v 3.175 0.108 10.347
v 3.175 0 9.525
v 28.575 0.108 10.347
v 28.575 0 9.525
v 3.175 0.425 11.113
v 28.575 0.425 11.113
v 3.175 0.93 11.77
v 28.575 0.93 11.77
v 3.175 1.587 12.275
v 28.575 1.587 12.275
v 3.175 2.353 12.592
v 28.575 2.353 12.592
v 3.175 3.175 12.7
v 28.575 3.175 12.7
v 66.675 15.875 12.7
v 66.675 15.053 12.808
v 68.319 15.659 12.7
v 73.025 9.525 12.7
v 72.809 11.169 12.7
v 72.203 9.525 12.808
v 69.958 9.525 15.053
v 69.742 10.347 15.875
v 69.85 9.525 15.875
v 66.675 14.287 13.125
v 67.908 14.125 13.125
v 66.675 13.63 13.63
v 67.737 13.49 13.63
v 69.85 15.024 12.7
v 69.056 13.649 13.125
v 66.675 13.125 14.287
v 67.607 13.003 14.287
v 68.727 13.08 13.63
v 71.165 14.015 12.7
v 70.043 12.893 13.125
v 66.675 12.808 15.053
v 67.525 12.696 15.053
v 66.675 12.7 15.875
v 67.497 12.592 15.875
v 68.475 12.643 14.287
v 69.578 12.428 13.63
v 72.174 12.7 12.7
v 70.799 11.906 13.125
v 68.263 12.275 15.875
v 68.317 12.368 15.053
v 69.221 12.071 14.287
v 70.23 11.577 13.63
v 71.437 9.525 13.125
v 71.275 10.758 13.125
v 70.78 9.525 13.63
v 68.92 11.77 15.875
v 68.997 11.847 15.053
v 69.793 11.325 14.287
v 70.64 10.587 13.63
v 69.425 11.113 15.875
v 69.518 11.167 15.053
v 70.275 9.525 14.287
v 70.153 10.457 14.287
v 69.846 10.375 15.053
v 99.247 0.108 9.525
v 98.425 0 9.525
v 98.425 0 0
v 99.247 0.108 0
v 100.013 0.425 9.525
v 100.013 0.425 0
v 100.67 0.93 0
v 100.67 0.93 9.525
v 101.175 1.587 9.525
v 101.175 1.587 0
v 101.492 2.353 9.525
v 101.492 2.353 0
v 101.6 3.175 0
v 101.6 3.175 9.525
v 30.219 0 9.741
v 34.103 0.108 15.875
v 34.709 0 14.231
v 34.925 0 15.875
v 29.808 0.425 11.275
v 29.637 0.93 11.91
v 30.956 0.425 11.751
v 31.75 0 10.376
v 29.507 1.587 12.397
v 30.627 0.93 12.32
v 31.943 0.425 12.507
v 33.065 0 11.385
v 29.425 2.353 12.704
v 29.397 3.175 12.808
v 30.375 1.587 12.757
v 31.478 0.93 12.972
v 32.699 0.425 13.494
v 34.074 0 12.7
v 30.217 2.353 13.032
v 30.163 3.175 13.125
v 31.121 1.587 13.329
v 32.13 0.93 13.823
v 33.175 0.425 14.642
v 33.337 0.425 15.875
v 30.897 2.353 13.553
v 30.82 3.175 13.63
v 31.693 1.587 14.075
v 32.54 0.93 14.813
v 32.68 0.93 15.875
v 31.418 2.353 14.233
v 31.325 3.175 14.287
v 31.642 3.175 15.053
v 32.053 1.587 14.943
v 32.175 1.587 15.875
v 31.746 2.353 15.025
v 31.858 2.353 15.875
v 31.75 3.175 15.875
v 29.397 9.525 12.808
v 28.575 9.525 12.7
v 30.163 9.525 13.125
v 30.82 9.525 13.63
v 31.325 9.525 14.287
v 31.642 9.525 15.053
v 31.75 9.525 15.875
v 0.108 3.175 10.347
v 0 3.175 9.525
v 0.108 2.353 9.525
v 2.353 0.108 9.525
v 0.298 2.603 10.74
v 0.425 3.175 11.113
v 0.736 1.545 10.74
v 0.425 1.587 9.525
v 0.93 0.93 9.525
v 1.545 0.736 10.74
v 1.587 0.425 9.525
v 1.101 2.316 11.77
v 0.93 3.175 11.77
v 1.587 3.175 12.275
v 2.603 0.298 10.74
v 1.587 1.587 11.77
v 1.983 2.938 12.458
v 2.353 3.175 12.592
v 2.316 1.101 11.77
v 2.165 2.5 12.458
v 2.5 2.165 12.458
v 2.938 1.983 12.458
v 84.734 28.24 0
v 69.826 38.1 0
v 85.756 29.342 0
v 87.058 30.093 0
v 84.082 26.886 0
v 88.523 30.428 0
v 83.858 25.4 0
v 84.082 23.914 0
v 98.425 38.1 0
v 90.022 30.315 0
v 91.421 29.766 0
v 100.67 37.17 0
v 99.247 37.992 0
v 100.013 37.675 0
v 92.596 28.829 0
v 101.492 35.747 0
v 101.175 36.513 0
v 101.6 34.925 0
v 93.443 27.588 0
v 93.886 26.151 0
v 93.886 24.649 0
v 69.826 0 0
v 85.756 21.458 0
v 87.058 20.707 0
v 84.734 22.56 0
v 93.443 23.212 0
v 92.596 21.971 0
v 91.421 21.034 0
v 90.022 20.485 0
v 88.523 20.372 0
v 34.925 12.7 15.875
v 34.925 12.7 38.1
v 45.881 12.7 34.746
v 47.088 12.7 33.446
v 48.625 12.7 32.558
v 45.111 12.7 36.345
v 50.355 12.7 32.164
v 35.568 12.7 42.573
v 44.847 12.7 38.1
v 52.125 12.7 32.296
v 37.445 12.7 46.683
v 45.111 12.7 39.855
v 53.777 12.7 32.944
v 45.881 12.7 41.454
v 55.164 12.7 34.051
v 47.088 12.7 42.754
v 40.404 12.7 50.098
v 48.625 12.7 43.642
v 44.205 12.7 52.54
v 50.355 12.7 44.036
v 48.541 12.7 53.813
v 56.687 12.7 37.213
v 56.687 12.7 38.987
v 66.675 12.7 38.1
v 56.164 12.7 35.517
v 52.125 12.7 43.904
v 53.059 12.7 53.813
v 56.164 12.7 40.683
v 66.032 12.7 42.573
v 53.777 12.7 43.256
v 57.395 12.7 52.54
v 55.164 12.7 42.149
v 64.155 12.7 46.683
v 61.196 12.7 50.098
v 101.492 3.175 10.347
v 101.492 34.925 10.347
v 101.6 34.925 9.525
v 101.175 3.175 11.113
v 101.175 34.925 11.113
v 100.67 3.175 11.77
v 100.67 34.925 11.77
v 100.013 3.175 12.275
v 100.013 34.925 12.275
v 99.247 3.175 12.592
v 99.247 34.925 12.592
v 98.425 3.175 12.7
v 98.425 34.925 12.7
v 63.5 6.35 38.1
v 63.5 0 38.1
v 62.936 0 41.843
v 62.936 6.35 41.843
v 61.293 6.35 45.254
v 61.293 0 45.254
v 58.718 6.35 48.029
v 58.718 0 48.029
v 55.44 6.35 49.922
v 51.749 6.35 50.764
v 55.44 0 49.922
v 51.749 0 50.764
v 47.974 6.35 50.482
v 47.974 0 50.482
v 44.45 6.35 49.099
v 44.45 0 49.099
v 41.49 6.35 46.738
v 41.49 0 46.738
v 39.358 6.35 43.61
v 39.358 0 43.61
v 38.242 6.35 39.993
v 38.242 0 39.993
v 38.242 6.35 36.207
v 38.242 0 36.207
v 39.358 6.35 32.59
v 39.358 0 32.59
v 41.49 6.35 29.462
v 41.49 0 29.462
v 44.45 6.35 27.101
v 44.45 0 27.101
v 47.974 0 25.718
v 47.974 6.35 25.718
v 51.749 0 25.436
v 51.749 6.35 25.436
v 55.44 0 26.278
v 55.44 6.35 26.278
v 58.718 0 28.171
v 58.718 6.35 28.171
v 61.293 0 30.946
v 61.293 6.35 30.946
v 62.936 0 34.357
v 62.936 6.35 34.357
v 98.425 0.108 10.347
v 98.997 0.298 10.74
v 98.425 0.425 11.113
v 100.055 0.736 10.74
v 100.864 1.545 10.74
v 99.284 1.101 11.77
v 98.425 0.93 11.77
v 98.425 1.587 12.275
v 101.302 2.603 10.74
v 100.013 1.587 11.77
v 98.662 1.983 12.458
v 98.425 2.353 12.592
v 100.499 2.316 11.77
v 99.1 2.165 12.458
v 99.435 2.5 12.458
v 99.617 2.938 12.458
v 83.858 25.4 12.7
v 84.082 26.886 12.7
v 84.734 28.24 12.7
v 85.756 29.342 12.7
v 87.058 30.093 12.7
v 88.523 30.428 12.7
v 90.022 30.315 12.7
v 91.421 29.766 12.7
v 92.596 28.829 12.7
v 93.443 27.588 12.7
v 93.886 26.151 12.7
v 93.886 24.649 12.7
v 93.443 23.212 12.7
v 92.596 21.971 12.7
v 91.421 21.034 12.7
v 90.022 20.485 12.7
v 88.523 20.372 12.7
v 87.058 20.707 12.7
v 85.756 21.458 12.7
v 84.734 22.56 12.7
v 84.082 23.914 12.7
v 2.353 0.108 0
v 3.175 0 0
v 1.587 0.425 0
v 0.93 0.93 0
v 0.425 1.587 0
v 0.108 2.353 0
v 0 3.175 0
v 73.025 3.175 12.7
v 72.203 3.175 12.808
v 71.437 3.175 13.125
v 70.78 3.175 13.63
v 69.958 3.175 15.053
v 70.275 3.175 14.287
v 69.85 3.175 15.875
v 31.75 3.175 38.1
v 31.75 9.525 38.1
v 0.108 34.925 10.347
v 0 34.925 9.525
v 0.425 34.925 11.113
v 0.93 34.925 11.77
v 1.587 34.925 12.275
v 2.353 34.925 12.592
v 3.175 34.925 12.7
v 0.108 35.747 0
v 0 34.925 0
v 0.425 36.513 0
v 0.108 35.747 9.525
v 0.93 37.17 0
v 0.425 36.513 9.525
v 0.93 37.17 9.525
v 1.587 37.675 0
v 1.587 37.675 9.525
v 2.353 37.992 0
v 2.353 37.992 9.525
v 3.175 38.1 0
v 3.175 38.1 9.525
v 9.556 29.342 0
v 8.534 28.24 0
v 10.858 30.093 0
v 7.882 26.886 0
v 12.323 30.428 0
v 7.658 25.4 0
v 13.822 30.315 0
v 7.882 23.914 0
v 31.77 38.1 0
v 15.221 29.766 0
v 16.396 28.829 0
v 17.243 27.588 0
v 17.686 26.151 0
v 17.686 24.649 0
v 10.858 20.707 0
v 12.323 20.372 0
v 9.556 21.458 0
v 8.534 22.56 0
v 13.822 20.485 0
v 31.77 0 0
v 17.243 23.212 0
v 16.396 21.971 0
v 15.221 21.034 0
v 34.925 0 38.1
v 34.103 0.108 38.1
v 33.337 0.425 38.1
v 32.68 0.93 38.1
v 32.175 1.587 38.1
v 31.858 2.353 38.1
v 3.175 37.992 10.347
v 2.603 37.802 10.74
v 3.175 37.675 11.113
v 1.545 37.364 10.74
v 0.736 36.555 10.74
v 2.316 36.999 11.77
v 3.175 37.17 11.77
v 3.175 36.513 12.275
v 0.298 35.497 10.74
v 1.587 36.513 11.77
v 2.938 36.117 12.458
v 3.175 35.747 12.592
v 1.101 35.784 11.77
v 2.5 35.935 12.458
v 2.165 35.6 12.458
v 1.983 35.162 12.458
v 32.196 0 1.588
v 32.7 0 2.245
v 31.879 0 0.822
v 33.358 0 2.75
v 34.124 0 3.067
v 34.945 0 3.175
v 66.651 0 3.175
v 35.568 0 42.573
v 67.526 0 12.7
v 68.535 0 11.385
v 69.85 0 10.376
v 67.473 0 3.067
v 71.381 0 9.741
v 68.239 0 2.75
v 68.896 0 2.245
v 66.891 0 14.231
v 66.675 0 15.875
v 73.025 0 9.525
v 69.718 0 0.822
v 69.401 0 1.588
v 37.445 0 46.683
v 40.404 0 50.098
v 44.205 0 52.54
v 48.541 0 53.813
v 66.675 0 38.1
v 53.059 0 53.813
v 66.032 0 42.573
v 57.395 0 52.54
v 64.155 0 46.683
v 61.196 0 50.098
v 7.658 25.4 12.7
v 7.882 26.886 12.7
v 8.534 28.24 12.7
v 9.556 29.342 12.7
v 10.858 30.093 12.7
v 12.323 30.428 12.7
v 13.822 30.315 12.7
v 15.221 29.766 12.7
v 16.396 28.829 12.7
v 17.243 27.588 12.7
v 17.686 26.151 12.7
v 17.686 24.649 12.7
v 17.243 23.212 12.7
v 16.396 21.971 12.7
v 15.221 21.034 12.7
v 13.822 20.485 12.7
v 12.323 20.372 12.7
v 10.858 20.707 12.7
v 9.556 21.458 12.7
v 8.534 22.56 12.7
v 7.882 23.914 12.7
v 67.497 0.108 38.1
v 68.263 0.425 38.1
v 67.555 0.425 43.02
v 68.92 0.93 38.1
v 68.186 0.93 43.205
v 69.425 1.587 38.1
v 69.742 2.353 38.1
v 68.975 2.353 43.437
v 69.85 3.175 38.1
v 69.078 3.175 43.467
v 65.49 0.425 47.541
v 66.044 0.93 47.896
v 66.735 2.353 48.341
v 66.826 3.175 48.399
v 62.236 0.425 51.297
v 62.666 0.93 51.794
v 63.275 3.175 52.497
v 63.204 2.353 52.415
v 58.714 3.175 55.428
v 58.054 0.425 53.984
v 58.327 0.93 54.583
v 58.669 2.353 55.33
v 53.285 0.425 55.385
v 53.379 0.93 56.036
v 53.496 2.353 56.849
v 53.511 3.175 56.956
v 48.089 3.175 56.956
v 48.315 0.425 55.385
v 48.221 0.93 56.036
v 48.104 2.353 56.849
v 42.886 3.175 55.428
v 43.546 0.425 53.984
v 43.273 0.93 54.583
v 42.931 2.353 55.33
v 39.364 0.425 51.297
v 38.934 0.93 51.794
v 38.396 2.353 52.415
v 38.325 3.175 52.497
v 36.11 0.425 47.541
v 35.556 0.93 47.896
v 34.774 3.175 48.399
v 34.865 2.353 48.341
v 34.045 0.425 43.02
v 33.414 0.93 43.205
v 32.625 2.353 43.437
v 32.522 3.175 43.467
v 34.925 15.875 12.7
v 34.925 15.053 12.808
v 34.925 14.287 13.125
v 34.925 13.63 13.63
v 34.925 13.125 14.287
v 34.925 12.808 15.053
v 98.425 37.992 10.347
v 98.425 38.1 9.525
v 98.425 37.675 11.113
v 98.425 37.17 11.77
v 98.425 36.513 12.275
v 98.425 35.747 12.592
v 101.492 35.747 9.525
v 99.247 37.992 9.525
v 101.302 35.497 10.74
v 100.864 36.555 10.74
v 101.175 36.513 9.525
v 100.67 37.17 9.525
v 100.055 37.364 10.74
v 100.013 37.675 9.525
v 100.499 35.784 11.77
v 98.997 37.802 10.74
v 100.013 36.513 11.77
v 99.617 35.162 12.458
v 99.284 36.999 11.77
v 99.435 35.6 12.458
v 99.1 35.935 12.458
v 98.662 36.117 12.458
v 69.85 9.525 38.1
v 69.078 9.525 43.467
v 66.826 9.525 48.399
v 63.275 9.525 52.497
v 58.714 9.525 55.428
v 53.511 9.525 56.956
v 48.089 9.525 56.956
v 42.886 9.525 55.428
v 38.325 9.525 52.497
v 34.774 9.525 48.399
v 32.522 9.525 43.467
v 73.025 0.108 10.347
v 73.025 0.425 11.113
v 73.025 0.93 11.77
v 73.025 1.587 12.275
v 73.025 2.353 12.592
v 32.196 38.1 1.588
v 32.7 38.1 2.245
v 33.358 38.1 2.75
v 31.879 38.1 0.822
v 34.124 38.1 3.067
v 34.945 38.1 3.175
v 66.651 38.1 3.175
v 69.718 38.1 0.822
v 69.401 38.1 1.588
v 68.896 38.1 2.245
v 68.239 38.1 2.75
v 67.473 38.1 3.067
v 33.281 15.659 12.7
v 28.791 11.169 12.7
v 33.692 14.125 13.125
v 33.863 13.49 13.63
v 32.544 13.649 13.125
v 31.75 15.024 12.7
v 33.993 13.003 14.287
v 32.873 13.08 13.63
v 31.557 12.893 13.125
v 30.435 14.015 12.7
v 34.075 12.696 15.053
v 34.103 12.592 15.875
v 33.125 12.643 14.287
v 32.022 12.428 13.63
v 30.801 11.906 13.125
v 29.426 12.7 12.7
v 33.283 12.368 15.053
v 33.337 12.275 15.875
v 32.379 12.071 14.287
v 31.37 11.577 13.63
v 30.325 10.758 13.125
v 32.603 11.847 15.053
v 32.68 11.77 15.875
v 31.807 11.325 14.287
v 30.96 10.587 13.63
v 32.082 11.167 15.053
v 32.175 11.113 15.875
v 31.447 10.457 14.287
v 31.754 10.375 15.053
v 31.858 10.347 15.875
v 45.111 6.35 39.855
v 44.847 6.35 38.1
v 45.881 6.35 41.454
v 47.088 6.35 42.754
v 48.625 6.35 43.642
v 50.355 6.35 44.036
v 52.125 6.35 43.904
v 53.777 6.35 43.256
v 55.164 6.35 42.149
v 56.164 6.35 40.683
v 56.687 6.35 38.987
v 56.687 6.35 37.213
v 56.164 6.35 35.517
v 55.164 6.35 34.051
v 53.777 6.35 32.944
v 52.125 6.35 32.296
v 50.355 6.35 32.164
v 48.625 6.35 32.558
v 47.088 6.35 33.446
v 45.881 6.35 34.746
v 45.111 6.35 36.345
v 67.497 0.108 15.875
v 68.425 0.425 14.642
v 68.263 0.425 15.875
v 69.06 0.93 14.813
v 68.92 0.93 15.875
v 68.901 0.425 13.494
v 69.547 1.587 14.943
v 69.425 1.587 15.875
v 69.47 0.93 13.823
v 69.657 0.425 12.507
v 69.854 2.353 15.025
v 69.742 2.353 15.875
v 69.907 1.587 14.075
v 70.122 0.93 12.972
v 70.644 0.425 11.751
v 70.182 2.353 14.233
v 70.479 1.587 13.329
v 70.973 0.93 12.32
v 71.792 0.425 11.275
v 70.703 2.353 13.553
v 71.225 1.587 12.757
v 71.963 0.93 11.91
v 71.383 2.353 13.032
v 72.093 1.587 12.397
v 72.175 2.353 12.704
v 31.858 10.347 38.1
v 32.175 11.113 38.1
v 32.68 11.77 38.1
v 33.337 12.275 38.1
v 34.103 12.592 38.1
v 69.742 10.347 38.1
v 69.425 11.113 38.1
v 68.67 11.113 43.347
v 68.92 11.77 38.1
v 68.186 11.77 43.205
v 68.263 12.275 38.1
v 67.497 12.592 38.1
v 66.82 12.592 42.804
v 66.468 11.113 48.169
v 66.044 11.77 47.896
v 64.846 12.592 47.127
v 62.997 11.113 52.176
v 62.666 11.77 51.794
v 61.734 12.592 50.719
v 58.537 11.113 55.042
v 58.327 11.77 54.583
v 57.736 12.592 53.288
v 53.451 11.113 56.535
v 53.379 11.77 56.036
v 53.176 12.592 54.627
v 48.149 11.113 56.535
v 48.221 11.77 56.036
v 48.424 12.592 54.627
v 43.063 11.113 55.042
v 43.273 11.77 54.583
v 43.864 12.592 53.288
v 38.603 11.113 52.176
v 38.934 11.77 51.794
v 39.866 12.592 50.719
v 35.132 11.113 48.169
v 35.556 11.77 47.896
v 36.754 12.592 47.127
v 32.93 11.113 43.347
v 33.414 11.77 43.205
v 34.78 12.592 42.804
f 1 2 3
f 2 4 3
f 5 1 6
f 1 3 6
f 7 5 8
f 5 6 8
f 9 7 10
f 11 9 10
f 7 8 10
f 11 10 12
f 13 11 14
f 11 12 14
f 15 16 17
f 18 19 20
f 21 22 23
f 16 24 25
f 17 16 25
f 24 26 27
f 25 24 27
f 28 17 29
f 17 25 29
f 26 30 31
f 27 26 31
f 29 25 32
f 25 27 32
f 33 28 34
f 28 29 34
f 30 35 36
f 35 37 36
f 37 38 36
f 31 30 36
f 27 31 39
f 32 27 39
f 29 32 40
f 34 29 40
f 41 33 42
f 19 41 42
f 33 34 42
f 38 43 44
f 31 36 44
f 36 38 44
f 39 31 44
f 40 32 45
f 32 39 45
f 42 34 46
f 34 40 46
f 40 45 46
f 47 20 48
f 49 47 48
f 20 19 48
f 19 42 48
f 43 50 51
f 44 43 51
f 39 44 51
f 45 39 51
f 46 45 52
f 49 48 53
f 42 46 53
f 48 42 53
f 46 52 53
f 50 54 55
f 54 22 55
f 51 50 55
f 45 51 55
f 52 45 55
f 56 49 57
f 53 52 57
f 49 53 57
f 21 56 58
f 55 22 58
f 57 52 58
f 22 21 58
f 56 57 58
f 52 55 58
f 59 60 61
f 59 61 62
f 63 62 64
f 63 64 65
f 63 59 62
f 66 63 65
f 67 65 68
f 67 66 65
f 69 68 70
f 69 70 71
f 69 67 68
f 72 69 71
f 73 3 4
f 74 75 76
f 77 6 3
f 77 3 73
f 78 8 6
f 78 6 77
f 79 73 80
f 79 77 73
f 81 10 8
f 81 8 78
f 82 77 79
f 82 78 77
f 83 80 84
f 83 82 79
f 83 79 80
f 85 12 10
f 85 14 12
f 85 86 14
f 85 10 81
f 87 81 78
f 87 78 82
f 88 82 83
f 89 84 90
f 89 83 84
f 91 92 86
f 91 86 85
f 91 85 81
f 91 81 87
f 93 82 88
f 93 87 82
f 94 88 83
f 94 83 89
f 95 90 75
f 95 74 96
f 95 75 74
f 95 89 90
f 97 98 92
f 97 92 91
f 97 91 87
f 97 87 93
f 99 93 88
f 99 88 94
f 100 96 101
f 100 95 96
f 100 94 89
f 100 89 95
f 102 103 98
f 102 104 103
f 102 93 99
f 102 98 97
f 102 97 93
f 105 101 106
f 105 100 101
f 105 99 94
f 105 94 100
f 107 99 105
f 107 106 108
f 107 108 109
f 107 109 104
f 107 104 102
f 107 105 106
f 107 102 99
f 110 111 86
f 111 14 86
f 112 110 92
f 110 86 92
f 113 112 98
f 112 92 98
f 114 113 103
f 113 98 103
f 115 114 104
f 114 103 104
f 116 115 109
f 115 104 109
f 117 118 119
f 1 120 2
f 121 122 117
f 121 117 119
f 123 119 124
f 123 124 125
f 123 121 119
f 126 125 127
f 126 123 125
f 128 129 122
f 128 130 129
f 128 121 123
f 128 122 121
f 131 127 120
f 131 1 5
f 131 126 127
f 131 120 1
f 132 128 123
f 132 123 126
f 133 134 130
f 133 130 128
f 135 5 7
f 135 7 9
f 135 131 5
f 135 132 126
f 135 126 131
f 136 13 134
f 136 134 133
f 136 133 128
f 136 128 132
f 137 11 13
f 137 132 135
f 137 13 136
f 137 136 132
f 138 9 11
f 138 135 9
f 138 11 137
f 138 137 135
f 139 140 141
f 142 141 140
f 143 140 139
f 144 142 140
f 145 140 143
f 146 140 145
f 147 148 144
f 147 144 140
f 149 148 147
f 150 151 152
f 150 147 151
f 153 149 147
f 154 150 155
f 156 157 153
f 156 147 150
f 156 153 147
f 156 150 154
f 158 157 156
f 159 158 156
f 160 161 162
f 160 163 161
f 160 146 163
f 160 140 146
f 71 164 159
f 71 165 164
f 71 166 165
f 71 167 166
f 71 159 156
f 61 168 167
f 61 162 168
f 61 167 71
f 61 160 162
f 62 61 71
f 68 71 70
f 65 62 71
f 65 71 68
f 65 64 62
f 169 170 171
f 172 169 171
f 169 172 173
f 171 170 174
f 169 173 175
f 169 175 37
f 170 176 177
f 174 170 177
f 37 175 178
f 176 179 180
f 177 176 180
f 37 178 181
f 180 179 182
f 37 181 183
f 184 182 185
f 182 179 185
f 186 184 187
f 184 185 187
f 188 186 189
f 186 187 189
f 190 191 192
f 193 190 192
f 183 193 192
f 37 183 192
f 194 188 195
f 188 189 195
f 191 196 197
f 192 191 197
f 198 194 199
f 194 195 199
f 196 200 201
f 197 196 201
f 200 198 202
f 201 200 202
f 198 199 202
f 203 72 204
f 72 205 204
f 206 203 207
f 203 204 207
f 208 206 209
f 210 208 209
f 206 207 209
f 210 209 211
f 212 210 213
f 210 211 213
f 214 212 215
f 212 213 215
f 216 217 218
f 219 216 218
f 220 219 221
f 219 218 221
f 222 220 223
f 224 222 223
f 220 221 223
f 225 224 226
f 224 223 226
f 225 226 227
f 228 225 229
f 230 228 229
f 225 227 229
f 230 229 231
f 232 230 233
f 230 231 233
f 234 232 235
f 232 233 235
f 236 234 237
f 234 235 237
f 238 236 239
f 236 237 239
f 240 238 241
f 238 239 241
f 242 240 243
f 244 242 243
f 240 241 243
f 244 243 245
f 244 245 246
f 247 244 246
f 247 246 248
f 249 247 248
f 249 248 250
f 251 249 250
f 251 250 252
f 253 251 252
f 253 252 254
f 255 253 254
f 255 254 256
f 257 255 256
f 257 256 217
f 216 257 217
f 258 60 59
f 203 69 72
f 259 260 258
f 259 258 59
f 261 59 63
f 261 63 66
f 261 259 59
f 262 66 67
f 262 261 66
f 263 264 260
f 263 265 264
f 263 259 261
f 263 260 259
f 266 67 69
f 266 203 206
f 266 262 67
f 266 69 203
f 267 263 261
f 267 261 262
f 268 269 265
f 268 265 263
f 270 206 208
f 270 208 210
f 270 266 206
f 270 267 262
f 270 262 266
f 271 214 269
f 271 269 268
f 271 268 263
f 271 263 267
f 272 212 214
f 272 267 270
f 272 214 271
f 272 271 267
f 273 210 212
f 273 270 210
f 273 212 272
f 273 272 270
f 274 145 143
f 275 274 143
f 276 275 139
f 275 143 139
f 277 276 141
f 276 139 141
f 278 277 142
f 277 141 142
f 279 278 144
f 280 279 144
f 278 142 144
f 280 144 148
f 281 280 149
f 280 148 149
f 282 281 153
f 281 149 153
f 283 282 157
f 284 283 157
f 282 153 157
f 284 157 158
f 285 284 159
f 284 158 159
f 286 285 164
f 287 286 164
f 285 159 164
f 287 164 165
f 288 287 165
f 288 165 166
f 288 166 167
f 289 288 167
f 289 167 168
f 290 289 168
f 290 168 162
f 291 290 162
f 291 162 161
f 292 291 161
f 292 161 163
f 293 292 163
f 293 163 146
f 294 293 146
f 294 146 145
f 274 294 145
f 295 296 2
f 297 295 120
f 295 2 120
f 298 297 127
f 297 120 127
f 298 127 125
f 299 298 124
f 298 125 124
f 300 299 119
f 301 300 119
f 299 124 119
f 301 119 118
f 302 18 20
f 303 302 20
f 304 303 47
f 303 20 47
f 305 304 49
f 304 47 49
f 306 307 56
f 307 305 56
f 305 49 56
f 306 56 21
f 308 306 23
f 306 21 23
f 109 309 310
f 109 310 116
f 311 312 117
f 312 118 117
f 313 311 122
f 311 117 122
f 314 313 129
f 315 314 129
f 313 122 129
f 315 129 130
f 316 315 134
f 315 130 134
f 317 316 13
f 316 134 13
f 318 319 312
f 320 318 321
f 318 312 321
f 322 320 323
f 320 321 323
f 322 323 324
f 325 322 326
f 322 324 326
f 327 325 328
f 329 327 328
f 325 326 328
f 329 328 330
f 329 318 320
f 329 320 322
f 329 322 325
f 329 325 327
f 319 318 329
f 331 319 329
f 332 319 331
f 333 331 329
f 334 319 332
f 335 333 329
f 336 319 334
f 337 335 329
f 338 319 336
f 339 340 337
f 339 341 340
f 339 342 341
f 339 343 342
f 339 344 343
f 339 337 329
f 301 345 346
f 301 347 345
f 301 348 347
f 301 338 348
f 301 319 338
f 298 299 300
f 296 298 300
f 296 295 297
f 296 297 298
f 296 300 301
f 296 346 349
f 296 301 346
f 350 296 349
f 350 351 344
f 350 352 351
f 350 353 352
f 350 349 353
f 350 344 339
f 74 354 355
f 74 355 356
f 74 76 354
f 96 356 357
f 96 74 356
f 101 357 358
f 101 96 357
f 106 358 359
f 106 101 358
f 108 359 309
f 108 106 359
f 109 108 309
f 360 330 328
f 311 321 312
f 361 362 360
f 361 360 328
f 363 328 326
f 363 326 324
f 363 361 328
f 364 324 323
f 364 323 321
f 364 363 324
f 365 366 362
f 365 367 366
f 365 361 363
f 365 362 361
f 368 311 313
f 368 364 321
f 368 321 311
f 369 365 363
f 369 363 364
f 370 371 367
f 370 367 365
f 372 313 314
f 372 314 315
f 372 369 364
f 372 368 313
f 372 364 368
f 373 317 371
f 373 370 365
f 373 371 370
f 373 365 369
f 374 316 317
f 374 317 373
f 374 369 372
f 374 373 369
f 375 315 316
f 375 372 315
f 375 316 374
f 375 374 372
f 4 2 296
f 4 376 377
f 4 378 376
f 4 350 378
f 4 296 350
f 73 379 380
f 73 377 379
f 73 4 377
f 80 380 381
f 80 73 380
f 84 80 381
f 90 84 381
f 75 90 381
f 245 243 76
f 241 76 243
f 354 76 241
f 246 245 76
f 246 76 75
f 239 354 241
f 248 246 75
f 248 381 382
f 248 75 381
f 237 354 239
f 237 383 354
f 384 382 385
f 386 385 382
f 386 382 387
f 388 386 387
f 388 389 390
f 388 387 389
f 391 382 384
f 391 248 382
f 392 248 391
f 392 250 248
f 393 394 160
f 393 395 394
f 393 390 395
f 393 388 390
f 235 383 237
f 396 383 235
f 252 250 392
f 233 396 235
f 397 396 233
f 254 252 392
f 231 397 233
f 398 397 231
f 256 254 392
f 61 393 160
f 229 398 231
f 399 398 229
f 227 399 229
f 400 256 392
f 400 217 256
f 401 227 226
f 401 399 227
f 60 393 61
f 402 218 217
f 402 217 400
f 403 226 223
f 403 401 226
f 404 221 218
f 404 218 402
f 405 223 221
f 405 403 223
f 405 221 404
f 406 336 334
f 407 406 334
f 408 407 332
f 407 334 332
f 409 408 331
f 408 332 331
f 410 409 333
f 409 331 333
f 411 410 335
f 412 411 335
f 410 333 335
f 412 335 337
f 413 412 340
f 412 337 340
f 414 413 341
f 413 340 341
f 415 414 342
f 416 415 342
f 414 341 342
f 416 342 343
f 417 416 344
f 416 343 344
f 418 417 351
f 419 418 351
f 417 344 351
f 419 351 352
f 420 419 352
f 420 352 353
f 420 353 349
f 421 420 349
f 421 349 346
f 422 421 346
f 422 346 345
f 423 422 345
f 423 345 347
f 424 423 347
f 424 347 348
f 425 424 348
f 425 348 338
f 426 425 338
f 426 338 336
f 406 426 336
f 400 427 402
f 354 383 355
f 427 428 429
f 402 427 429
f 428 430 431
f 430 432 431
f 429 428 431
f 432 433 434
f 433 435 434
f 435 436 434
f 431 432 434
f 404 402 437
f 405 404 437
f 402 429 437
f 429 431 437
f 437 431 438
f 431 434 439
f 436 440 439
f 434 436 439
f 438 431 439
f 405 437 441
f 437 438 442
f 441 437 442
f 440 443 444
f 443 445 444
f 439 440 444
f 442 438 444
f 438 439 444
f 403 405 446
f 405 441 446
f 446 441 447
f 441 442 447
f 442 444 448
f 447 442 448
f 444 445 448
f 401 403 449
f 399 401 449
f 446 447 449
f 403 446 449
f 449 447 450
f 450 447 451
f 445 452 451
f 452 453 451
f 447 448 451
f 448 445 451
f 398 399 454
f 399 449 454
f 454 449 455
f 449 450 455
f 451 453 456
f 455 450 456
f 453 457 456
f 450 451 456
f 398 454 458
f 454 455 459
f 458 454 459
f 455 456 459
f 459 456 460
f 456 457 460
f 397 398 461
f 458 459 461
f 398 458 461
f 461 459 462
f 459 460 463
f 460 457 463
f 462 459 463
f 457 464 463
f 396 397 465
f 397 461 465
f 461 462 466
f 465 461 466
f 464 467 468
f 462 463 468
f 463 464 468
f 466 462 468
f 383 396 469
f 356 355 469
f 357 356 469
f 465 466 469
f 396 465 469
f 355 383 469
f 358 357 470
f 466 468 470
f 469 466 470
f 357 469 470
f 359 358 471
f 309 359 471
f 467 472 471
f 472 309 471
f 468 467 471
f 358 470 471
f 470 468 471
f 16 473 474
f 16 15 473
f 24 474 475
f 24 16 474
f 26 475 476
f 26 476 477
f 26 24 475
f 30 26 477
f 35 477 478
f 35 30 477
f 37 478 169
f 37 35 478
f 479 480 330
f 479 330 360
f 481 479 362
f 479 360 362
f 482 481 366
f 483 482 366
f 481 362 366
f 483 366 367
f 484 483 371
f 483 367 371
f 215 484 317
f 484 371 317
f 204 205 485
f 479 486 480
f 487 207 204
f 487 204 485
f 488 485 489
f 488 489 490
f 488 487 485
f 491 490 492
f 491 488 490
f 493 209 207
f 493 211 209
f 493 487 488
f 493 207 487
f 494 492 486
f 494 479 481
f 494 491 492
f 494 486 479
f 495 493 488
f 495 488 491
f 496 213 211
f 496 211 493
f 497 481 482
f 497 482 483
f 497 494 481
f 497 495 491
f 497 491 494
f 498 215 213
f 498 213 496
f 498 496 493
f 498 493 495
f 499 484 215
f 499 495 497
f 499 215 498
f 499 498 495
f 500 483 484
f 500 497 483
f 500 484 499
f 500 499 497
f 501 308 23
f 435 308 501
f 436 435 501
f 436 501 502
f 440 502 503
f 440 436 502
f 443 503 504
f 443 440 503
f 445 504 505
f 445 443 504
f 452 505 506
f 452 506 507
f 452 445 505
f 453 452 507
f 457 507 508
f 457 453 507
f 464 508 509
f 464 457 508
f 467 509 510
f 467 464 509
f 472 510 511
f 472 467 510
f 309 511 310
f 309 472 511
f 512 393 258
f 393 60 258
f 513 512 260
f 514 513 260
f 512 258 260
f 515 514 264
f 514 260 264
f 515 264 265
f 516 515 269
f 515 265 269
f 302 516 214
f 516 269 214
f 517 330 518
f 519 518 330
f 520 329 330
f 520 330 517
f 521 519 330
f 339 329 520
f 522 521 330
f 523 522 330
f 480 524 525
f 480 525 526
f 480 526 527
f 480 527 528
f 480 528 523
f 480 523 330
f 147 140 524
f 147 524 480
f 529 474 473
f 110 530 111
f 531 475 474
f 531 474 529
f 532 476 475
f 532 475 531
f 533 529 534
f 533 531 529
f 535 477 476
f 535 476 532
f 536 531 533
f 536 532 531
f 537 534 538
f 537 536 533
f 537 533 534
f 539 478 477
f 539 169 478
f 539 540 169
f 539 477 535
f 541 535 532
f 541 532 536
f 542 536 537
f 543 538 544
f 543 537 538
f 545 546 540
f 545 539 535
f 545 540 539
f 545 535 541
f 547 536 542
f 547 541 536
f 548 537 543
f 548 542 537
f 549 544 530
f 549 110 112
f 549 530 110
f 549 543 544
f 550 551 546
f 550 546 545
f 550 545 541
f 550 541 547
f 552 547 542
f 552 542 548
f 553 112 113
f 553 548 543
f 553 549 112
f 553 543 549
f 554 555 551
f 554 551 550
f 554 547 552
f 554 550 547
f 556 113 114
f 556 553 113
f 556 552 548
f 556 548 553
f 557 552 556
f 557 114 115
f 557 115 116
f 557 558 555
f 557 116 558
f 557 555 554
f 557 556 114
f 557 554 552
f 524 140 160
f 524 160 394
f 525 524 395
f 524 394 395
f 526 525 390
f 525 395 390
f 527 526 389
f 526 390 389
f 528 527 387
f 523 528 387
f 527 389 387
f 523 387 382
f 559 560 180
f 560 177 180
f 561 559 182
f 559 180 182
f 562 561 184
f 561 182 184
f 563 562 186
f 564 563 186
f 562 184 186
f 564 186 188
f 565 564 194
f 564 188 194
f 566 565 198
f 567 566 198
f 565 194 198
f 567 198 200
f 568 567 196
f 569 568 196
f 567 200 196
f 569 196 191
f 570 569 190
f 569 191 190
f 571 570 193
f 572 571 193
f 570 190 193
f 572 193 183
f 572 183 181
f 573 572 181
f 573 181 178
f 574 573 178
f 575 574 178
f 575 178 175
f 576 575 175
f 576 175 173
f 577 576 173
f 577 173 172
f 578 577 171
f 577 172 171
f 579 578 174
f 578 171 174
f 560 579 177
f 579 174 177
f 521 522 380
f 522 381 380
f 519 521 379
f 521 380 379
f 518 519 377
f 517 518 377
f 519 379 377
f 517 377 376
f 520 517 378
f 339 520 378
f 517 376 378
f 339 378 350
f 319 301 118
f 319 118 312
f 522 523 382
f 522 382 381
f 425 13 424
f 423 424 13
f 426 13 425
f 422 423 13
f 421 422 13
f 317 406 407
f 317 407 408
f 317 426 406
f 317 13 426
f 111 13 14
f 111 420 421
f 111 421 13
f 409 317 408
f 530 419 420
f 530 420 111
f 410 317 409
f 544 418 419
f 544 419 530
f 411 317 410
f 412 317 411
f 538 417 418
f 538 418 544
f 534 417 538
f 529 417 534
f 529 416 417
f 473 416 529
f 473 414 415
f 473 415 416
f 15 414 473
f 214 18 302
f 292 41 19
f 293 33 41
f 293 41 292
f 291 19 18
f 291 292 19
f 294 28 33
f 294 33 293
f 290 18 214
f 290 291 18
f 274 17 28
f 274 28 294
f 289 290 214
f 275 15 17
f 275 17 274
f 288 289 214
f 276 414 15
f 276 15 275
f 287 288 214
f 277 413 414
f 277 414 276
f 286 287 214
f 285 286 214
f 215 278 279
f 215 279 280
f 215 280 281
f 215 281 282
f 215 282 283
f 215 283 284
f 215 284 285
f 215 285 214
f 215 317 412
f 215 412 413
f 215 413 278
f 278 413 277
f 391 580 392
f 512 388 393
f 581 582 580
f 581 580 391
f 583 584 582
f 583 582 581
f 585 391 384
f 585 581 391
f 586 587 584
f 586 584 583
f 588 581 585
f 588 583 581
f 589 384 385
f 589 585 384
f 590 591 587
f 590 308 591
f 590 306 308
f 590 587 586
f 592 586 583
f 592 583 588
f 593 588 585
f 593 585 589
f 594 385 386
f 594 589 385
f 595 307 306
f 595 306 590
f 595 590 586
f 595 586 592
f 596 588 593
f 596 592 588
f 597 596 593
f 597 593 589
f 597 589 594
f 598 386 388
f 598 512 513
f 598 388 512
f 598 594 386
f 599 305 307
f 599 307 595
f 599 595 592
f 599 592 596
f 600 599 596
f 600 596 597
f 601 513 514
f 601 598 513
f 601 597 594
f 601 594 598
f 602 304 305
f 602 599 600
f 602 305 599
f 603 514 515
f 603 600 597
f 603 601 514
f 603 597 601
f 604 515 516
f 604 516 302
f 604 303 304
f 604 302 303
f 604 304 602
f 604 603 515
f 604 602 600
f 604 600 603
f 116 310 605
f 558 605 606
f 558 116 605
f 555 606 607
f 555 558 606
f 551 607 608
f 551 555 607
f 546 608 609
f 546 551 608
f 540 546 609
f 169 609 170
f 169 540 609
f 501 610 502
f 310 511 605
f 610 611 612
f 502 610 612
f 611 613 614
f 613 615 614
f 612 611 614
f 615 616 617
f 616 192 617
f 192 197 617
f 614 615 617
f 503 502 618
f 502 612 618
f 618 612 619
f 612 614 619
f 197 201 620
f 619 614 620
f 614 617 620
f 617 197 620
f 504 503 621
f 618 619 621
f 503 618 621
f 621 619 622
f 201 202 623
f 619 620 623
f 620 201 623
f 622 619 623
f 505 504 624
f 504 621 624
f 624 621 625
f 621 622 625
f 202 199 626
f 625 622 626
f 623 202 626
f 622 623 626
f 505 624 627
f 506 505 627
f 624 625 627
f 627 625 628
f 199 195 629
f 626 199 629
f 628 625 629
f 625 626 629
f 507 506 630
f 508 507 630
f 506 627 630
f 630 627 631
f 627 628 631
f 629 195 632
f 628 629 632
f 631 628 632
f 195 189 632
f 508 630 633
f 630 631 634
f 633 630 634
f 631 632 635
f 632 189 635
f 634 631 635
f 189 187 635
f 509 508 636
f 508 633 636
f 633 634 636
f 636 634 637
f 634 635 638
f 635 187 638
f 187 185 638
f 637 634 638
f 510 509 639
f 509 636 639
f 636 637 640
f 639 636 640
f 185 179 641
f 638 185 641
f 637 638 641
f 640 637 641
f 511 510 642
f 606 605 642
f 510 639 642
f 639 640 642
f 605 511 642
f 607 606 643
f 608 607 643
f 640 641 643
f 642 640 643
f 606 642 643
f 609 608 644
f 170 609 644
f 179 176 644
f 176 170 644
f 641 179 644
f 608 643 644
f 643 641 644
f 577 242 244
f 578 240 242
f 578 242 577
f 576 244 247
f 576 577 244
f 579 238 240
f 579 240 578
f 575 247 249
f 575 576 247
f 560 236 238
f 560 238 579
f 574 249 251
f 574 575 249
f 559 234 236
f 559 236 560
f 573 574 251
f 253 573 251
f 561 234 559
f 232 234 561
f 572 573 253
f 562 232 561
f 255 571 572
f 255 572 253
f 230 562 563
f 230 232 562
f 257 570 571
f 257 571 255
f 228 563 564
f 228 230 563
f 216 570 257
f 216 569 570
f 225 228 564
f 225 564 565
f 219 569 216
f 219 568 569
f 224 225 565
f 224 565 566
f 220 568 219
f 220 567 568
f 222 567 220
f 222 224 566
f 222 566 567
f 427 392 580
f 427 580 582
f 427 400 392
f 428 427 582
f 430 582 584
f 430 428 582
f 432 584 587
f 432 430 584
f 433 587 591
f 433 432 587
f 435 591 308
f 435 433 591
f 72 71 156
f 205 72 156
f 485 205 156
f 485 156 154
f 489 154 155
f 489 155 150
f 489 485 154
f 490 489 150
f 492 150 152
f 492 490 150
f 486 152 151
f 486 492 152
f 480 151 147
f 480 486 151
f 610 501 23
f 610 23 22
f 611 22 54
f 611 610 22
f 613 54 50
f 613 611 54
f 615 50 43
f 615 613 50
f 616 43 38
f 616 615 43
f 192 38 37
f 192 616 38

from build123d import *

# Parameters (mm, degrees)
F0_W           = 101.6
F0_H           = 38.1
F1_DEPTH       = 12.7
F2_W           = 38.1
F2_H           = 12.7
F3_DEPTH       = 12.7
F4_D           = 11.90625
F4_CBORE_D     = 25.4
F4_CBORE_DEPTH = 6.35
F5_W           = 38.0556955934
F5_H           = 3.175
F6_DEPTH       = 38.101
F8_D           = 10.0838
F9_R           = 3.17499
F10_R          = 3.17499


# Not quite as in the source:
# - a fillet or chamfer is up to 0.001 mm smaller than in the source, because OpenCascade refuses the exact size
# - a length typed as a fraction of an inch, garbled in the dataset ("3 / 203.2 mm" for 3/8 in), is restored


with BuildPart() as f1:
    # F0 (on Top) → F1 (new body)
    with BuildSketch(Plane.XY):
        with Locations((50.8, 19.05)):
            Rectangle(F0_W, F0_H)
    extrude(amount=F1_DEPTH)

    # F2 (on face) → F3 (join)
    with BuildSketch(Plane.XZ):
        with BuildLine():
            Line((31.75, 38.1), (31.75, 12.7))
            Line((31.75, 12.7), (69.85, 12.7))
            Line((69.85, 12.7), (69.85, 38.1))
            ThreePointArc((69.85, 38.1), (50.8, 57.15), (31.75, 38.1))
        make_face()
        with Locations((50.8, 6.35)):
            Rectangle(F2_W, F2_H)
    extrude(amount=-F3_DEPTH)

    # F4 (through all)
    with Locations(Plane.XZ):
        with Locations((50.8, 38.1)):
            CounterBoreHole(F4_D / 2, F4_CBORE_D / 2, F4_CBORE_DEPTH)

    # F5 (on face) → F6 (cut, through all)
    with BuildSketch(Plane(origin=(0, 38.1, 0), x_dir=(-1, 0, 0), z_dir=(0, 1, 0))):
        with Locations((-50.798330456, 1.5875)):
            Rectangle(F5_W, F5_H)
    extrude(amount=-F6_DEPTH, mode=Mode.SUBTRACT)

    # F8 (through all)
    with Locations(Plane.XY.offset(12.7)):
        with Locations((12.7, 25.4), (88.9, 25.4)):
            Hole(F8_D / 2)

    # F9 (radius 3.175 in the source; OpenCascade refuses exactly that, so slightly less here)
    f9_edges = [f1.edges().sort_by_distance(p)[0] for p in [
        (101.6, 38.1, 6.35),
        (0, 38.1, 6.35),
        (0, 0, 6.35),
        (101.6, 0, 6.35),
        (31.770483, 19.05, 3.175),
        (69.826178, 19.05, 3.175),
    ]]
    fillet(f9_edges, radius=F9_R)

    # F10 (radius 3.175 in the source; OpenCascade refuses exactly that, so slightly less here)
    f10_edges = [f1.edges().sort_by_distance(p)[0] for p in [
        (17.462495, 0, 12.7),
        (50.8, 38.1, 12.7),
        (0, 19.05, 12.7),
        (84.137505, 0, 12.7),
        (101.6, 19.05, 12.7),
        (69.85, 6.35, 12.7),
        (50.8, 0, 57.15),
        (50.8, 12.7, 57.15),
        (69.85, 12.7, 25.4),
        (50.8, 12.7, 12.7),
        (31.75, 6.35, 12.7),
        (31.75, 12.7, 25.4),
        (31.75, 0, 25.4),
        (69.85, 0, 25.4),
    ]]
    fillet(f10_edges, radius=F10_R)


solid = f1.part
